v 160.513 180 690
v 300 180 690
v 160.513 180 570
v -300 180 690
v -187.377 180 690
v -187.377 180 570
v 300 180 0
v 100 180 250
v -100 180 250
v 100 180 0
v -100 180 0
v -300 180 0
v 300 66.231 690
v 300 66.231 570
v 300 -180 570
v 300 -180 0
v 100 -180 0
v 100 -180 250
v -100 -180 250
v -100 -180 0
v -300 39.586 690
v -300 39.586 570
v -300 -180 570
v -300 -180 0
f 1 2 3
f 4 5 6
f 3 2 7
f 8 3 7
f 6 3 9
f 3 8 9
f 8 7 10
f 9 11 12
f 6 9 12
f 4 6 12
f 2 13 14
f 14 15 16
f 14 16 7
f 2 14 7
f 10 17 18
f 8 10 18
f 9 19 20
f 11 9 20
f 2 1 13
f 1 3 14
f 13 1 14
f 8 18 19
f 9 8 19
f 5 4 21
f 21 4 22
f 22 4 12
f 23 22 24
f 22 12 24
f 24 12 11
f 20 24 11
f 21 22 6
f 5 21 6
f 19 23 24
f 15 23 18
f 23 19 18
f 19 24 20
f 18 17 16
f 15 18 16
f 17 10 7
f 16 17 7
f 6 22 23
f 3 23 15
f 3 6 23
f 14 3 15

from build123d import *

# Parameters (mm, degrees)
F0_W     = 600
F0_H     = 360
F1_DEPTH = 570
F3_DEPTH = 120
F5_DEPTH = 360.001


with BuildPart() as f1:
    # F0 (on Top) → F1 (new body)
    with BuildSketch(Plane.XY):
        Rectangle(F0_W, F0_H)
    extrude(amount=F1_DEPTH)

    # F2 (on face) → F3 (join)
    with BuildSketch(Plane.XY.offset(570)):
        Polygon((-300, 39.58638), (-187.376666, 180), (-300, 180), align=None)
        Polygon((300, 180), (160.513226, 180), (300, 66.23076), align=None)
    extrude(amount=F3_DEPTH)

    # F4 (on face) → F5 (cut, through all)
    with BuildSketch(Plane.XZ.offset(180)):
        Polygon((0, 0), (100, 0), (100, 250), (-100, 250), (-100, 0), align=None)
    extrude(amount=-F5_DEPTH, mode=Mode.SUBTRACT)


solid = f1.part
